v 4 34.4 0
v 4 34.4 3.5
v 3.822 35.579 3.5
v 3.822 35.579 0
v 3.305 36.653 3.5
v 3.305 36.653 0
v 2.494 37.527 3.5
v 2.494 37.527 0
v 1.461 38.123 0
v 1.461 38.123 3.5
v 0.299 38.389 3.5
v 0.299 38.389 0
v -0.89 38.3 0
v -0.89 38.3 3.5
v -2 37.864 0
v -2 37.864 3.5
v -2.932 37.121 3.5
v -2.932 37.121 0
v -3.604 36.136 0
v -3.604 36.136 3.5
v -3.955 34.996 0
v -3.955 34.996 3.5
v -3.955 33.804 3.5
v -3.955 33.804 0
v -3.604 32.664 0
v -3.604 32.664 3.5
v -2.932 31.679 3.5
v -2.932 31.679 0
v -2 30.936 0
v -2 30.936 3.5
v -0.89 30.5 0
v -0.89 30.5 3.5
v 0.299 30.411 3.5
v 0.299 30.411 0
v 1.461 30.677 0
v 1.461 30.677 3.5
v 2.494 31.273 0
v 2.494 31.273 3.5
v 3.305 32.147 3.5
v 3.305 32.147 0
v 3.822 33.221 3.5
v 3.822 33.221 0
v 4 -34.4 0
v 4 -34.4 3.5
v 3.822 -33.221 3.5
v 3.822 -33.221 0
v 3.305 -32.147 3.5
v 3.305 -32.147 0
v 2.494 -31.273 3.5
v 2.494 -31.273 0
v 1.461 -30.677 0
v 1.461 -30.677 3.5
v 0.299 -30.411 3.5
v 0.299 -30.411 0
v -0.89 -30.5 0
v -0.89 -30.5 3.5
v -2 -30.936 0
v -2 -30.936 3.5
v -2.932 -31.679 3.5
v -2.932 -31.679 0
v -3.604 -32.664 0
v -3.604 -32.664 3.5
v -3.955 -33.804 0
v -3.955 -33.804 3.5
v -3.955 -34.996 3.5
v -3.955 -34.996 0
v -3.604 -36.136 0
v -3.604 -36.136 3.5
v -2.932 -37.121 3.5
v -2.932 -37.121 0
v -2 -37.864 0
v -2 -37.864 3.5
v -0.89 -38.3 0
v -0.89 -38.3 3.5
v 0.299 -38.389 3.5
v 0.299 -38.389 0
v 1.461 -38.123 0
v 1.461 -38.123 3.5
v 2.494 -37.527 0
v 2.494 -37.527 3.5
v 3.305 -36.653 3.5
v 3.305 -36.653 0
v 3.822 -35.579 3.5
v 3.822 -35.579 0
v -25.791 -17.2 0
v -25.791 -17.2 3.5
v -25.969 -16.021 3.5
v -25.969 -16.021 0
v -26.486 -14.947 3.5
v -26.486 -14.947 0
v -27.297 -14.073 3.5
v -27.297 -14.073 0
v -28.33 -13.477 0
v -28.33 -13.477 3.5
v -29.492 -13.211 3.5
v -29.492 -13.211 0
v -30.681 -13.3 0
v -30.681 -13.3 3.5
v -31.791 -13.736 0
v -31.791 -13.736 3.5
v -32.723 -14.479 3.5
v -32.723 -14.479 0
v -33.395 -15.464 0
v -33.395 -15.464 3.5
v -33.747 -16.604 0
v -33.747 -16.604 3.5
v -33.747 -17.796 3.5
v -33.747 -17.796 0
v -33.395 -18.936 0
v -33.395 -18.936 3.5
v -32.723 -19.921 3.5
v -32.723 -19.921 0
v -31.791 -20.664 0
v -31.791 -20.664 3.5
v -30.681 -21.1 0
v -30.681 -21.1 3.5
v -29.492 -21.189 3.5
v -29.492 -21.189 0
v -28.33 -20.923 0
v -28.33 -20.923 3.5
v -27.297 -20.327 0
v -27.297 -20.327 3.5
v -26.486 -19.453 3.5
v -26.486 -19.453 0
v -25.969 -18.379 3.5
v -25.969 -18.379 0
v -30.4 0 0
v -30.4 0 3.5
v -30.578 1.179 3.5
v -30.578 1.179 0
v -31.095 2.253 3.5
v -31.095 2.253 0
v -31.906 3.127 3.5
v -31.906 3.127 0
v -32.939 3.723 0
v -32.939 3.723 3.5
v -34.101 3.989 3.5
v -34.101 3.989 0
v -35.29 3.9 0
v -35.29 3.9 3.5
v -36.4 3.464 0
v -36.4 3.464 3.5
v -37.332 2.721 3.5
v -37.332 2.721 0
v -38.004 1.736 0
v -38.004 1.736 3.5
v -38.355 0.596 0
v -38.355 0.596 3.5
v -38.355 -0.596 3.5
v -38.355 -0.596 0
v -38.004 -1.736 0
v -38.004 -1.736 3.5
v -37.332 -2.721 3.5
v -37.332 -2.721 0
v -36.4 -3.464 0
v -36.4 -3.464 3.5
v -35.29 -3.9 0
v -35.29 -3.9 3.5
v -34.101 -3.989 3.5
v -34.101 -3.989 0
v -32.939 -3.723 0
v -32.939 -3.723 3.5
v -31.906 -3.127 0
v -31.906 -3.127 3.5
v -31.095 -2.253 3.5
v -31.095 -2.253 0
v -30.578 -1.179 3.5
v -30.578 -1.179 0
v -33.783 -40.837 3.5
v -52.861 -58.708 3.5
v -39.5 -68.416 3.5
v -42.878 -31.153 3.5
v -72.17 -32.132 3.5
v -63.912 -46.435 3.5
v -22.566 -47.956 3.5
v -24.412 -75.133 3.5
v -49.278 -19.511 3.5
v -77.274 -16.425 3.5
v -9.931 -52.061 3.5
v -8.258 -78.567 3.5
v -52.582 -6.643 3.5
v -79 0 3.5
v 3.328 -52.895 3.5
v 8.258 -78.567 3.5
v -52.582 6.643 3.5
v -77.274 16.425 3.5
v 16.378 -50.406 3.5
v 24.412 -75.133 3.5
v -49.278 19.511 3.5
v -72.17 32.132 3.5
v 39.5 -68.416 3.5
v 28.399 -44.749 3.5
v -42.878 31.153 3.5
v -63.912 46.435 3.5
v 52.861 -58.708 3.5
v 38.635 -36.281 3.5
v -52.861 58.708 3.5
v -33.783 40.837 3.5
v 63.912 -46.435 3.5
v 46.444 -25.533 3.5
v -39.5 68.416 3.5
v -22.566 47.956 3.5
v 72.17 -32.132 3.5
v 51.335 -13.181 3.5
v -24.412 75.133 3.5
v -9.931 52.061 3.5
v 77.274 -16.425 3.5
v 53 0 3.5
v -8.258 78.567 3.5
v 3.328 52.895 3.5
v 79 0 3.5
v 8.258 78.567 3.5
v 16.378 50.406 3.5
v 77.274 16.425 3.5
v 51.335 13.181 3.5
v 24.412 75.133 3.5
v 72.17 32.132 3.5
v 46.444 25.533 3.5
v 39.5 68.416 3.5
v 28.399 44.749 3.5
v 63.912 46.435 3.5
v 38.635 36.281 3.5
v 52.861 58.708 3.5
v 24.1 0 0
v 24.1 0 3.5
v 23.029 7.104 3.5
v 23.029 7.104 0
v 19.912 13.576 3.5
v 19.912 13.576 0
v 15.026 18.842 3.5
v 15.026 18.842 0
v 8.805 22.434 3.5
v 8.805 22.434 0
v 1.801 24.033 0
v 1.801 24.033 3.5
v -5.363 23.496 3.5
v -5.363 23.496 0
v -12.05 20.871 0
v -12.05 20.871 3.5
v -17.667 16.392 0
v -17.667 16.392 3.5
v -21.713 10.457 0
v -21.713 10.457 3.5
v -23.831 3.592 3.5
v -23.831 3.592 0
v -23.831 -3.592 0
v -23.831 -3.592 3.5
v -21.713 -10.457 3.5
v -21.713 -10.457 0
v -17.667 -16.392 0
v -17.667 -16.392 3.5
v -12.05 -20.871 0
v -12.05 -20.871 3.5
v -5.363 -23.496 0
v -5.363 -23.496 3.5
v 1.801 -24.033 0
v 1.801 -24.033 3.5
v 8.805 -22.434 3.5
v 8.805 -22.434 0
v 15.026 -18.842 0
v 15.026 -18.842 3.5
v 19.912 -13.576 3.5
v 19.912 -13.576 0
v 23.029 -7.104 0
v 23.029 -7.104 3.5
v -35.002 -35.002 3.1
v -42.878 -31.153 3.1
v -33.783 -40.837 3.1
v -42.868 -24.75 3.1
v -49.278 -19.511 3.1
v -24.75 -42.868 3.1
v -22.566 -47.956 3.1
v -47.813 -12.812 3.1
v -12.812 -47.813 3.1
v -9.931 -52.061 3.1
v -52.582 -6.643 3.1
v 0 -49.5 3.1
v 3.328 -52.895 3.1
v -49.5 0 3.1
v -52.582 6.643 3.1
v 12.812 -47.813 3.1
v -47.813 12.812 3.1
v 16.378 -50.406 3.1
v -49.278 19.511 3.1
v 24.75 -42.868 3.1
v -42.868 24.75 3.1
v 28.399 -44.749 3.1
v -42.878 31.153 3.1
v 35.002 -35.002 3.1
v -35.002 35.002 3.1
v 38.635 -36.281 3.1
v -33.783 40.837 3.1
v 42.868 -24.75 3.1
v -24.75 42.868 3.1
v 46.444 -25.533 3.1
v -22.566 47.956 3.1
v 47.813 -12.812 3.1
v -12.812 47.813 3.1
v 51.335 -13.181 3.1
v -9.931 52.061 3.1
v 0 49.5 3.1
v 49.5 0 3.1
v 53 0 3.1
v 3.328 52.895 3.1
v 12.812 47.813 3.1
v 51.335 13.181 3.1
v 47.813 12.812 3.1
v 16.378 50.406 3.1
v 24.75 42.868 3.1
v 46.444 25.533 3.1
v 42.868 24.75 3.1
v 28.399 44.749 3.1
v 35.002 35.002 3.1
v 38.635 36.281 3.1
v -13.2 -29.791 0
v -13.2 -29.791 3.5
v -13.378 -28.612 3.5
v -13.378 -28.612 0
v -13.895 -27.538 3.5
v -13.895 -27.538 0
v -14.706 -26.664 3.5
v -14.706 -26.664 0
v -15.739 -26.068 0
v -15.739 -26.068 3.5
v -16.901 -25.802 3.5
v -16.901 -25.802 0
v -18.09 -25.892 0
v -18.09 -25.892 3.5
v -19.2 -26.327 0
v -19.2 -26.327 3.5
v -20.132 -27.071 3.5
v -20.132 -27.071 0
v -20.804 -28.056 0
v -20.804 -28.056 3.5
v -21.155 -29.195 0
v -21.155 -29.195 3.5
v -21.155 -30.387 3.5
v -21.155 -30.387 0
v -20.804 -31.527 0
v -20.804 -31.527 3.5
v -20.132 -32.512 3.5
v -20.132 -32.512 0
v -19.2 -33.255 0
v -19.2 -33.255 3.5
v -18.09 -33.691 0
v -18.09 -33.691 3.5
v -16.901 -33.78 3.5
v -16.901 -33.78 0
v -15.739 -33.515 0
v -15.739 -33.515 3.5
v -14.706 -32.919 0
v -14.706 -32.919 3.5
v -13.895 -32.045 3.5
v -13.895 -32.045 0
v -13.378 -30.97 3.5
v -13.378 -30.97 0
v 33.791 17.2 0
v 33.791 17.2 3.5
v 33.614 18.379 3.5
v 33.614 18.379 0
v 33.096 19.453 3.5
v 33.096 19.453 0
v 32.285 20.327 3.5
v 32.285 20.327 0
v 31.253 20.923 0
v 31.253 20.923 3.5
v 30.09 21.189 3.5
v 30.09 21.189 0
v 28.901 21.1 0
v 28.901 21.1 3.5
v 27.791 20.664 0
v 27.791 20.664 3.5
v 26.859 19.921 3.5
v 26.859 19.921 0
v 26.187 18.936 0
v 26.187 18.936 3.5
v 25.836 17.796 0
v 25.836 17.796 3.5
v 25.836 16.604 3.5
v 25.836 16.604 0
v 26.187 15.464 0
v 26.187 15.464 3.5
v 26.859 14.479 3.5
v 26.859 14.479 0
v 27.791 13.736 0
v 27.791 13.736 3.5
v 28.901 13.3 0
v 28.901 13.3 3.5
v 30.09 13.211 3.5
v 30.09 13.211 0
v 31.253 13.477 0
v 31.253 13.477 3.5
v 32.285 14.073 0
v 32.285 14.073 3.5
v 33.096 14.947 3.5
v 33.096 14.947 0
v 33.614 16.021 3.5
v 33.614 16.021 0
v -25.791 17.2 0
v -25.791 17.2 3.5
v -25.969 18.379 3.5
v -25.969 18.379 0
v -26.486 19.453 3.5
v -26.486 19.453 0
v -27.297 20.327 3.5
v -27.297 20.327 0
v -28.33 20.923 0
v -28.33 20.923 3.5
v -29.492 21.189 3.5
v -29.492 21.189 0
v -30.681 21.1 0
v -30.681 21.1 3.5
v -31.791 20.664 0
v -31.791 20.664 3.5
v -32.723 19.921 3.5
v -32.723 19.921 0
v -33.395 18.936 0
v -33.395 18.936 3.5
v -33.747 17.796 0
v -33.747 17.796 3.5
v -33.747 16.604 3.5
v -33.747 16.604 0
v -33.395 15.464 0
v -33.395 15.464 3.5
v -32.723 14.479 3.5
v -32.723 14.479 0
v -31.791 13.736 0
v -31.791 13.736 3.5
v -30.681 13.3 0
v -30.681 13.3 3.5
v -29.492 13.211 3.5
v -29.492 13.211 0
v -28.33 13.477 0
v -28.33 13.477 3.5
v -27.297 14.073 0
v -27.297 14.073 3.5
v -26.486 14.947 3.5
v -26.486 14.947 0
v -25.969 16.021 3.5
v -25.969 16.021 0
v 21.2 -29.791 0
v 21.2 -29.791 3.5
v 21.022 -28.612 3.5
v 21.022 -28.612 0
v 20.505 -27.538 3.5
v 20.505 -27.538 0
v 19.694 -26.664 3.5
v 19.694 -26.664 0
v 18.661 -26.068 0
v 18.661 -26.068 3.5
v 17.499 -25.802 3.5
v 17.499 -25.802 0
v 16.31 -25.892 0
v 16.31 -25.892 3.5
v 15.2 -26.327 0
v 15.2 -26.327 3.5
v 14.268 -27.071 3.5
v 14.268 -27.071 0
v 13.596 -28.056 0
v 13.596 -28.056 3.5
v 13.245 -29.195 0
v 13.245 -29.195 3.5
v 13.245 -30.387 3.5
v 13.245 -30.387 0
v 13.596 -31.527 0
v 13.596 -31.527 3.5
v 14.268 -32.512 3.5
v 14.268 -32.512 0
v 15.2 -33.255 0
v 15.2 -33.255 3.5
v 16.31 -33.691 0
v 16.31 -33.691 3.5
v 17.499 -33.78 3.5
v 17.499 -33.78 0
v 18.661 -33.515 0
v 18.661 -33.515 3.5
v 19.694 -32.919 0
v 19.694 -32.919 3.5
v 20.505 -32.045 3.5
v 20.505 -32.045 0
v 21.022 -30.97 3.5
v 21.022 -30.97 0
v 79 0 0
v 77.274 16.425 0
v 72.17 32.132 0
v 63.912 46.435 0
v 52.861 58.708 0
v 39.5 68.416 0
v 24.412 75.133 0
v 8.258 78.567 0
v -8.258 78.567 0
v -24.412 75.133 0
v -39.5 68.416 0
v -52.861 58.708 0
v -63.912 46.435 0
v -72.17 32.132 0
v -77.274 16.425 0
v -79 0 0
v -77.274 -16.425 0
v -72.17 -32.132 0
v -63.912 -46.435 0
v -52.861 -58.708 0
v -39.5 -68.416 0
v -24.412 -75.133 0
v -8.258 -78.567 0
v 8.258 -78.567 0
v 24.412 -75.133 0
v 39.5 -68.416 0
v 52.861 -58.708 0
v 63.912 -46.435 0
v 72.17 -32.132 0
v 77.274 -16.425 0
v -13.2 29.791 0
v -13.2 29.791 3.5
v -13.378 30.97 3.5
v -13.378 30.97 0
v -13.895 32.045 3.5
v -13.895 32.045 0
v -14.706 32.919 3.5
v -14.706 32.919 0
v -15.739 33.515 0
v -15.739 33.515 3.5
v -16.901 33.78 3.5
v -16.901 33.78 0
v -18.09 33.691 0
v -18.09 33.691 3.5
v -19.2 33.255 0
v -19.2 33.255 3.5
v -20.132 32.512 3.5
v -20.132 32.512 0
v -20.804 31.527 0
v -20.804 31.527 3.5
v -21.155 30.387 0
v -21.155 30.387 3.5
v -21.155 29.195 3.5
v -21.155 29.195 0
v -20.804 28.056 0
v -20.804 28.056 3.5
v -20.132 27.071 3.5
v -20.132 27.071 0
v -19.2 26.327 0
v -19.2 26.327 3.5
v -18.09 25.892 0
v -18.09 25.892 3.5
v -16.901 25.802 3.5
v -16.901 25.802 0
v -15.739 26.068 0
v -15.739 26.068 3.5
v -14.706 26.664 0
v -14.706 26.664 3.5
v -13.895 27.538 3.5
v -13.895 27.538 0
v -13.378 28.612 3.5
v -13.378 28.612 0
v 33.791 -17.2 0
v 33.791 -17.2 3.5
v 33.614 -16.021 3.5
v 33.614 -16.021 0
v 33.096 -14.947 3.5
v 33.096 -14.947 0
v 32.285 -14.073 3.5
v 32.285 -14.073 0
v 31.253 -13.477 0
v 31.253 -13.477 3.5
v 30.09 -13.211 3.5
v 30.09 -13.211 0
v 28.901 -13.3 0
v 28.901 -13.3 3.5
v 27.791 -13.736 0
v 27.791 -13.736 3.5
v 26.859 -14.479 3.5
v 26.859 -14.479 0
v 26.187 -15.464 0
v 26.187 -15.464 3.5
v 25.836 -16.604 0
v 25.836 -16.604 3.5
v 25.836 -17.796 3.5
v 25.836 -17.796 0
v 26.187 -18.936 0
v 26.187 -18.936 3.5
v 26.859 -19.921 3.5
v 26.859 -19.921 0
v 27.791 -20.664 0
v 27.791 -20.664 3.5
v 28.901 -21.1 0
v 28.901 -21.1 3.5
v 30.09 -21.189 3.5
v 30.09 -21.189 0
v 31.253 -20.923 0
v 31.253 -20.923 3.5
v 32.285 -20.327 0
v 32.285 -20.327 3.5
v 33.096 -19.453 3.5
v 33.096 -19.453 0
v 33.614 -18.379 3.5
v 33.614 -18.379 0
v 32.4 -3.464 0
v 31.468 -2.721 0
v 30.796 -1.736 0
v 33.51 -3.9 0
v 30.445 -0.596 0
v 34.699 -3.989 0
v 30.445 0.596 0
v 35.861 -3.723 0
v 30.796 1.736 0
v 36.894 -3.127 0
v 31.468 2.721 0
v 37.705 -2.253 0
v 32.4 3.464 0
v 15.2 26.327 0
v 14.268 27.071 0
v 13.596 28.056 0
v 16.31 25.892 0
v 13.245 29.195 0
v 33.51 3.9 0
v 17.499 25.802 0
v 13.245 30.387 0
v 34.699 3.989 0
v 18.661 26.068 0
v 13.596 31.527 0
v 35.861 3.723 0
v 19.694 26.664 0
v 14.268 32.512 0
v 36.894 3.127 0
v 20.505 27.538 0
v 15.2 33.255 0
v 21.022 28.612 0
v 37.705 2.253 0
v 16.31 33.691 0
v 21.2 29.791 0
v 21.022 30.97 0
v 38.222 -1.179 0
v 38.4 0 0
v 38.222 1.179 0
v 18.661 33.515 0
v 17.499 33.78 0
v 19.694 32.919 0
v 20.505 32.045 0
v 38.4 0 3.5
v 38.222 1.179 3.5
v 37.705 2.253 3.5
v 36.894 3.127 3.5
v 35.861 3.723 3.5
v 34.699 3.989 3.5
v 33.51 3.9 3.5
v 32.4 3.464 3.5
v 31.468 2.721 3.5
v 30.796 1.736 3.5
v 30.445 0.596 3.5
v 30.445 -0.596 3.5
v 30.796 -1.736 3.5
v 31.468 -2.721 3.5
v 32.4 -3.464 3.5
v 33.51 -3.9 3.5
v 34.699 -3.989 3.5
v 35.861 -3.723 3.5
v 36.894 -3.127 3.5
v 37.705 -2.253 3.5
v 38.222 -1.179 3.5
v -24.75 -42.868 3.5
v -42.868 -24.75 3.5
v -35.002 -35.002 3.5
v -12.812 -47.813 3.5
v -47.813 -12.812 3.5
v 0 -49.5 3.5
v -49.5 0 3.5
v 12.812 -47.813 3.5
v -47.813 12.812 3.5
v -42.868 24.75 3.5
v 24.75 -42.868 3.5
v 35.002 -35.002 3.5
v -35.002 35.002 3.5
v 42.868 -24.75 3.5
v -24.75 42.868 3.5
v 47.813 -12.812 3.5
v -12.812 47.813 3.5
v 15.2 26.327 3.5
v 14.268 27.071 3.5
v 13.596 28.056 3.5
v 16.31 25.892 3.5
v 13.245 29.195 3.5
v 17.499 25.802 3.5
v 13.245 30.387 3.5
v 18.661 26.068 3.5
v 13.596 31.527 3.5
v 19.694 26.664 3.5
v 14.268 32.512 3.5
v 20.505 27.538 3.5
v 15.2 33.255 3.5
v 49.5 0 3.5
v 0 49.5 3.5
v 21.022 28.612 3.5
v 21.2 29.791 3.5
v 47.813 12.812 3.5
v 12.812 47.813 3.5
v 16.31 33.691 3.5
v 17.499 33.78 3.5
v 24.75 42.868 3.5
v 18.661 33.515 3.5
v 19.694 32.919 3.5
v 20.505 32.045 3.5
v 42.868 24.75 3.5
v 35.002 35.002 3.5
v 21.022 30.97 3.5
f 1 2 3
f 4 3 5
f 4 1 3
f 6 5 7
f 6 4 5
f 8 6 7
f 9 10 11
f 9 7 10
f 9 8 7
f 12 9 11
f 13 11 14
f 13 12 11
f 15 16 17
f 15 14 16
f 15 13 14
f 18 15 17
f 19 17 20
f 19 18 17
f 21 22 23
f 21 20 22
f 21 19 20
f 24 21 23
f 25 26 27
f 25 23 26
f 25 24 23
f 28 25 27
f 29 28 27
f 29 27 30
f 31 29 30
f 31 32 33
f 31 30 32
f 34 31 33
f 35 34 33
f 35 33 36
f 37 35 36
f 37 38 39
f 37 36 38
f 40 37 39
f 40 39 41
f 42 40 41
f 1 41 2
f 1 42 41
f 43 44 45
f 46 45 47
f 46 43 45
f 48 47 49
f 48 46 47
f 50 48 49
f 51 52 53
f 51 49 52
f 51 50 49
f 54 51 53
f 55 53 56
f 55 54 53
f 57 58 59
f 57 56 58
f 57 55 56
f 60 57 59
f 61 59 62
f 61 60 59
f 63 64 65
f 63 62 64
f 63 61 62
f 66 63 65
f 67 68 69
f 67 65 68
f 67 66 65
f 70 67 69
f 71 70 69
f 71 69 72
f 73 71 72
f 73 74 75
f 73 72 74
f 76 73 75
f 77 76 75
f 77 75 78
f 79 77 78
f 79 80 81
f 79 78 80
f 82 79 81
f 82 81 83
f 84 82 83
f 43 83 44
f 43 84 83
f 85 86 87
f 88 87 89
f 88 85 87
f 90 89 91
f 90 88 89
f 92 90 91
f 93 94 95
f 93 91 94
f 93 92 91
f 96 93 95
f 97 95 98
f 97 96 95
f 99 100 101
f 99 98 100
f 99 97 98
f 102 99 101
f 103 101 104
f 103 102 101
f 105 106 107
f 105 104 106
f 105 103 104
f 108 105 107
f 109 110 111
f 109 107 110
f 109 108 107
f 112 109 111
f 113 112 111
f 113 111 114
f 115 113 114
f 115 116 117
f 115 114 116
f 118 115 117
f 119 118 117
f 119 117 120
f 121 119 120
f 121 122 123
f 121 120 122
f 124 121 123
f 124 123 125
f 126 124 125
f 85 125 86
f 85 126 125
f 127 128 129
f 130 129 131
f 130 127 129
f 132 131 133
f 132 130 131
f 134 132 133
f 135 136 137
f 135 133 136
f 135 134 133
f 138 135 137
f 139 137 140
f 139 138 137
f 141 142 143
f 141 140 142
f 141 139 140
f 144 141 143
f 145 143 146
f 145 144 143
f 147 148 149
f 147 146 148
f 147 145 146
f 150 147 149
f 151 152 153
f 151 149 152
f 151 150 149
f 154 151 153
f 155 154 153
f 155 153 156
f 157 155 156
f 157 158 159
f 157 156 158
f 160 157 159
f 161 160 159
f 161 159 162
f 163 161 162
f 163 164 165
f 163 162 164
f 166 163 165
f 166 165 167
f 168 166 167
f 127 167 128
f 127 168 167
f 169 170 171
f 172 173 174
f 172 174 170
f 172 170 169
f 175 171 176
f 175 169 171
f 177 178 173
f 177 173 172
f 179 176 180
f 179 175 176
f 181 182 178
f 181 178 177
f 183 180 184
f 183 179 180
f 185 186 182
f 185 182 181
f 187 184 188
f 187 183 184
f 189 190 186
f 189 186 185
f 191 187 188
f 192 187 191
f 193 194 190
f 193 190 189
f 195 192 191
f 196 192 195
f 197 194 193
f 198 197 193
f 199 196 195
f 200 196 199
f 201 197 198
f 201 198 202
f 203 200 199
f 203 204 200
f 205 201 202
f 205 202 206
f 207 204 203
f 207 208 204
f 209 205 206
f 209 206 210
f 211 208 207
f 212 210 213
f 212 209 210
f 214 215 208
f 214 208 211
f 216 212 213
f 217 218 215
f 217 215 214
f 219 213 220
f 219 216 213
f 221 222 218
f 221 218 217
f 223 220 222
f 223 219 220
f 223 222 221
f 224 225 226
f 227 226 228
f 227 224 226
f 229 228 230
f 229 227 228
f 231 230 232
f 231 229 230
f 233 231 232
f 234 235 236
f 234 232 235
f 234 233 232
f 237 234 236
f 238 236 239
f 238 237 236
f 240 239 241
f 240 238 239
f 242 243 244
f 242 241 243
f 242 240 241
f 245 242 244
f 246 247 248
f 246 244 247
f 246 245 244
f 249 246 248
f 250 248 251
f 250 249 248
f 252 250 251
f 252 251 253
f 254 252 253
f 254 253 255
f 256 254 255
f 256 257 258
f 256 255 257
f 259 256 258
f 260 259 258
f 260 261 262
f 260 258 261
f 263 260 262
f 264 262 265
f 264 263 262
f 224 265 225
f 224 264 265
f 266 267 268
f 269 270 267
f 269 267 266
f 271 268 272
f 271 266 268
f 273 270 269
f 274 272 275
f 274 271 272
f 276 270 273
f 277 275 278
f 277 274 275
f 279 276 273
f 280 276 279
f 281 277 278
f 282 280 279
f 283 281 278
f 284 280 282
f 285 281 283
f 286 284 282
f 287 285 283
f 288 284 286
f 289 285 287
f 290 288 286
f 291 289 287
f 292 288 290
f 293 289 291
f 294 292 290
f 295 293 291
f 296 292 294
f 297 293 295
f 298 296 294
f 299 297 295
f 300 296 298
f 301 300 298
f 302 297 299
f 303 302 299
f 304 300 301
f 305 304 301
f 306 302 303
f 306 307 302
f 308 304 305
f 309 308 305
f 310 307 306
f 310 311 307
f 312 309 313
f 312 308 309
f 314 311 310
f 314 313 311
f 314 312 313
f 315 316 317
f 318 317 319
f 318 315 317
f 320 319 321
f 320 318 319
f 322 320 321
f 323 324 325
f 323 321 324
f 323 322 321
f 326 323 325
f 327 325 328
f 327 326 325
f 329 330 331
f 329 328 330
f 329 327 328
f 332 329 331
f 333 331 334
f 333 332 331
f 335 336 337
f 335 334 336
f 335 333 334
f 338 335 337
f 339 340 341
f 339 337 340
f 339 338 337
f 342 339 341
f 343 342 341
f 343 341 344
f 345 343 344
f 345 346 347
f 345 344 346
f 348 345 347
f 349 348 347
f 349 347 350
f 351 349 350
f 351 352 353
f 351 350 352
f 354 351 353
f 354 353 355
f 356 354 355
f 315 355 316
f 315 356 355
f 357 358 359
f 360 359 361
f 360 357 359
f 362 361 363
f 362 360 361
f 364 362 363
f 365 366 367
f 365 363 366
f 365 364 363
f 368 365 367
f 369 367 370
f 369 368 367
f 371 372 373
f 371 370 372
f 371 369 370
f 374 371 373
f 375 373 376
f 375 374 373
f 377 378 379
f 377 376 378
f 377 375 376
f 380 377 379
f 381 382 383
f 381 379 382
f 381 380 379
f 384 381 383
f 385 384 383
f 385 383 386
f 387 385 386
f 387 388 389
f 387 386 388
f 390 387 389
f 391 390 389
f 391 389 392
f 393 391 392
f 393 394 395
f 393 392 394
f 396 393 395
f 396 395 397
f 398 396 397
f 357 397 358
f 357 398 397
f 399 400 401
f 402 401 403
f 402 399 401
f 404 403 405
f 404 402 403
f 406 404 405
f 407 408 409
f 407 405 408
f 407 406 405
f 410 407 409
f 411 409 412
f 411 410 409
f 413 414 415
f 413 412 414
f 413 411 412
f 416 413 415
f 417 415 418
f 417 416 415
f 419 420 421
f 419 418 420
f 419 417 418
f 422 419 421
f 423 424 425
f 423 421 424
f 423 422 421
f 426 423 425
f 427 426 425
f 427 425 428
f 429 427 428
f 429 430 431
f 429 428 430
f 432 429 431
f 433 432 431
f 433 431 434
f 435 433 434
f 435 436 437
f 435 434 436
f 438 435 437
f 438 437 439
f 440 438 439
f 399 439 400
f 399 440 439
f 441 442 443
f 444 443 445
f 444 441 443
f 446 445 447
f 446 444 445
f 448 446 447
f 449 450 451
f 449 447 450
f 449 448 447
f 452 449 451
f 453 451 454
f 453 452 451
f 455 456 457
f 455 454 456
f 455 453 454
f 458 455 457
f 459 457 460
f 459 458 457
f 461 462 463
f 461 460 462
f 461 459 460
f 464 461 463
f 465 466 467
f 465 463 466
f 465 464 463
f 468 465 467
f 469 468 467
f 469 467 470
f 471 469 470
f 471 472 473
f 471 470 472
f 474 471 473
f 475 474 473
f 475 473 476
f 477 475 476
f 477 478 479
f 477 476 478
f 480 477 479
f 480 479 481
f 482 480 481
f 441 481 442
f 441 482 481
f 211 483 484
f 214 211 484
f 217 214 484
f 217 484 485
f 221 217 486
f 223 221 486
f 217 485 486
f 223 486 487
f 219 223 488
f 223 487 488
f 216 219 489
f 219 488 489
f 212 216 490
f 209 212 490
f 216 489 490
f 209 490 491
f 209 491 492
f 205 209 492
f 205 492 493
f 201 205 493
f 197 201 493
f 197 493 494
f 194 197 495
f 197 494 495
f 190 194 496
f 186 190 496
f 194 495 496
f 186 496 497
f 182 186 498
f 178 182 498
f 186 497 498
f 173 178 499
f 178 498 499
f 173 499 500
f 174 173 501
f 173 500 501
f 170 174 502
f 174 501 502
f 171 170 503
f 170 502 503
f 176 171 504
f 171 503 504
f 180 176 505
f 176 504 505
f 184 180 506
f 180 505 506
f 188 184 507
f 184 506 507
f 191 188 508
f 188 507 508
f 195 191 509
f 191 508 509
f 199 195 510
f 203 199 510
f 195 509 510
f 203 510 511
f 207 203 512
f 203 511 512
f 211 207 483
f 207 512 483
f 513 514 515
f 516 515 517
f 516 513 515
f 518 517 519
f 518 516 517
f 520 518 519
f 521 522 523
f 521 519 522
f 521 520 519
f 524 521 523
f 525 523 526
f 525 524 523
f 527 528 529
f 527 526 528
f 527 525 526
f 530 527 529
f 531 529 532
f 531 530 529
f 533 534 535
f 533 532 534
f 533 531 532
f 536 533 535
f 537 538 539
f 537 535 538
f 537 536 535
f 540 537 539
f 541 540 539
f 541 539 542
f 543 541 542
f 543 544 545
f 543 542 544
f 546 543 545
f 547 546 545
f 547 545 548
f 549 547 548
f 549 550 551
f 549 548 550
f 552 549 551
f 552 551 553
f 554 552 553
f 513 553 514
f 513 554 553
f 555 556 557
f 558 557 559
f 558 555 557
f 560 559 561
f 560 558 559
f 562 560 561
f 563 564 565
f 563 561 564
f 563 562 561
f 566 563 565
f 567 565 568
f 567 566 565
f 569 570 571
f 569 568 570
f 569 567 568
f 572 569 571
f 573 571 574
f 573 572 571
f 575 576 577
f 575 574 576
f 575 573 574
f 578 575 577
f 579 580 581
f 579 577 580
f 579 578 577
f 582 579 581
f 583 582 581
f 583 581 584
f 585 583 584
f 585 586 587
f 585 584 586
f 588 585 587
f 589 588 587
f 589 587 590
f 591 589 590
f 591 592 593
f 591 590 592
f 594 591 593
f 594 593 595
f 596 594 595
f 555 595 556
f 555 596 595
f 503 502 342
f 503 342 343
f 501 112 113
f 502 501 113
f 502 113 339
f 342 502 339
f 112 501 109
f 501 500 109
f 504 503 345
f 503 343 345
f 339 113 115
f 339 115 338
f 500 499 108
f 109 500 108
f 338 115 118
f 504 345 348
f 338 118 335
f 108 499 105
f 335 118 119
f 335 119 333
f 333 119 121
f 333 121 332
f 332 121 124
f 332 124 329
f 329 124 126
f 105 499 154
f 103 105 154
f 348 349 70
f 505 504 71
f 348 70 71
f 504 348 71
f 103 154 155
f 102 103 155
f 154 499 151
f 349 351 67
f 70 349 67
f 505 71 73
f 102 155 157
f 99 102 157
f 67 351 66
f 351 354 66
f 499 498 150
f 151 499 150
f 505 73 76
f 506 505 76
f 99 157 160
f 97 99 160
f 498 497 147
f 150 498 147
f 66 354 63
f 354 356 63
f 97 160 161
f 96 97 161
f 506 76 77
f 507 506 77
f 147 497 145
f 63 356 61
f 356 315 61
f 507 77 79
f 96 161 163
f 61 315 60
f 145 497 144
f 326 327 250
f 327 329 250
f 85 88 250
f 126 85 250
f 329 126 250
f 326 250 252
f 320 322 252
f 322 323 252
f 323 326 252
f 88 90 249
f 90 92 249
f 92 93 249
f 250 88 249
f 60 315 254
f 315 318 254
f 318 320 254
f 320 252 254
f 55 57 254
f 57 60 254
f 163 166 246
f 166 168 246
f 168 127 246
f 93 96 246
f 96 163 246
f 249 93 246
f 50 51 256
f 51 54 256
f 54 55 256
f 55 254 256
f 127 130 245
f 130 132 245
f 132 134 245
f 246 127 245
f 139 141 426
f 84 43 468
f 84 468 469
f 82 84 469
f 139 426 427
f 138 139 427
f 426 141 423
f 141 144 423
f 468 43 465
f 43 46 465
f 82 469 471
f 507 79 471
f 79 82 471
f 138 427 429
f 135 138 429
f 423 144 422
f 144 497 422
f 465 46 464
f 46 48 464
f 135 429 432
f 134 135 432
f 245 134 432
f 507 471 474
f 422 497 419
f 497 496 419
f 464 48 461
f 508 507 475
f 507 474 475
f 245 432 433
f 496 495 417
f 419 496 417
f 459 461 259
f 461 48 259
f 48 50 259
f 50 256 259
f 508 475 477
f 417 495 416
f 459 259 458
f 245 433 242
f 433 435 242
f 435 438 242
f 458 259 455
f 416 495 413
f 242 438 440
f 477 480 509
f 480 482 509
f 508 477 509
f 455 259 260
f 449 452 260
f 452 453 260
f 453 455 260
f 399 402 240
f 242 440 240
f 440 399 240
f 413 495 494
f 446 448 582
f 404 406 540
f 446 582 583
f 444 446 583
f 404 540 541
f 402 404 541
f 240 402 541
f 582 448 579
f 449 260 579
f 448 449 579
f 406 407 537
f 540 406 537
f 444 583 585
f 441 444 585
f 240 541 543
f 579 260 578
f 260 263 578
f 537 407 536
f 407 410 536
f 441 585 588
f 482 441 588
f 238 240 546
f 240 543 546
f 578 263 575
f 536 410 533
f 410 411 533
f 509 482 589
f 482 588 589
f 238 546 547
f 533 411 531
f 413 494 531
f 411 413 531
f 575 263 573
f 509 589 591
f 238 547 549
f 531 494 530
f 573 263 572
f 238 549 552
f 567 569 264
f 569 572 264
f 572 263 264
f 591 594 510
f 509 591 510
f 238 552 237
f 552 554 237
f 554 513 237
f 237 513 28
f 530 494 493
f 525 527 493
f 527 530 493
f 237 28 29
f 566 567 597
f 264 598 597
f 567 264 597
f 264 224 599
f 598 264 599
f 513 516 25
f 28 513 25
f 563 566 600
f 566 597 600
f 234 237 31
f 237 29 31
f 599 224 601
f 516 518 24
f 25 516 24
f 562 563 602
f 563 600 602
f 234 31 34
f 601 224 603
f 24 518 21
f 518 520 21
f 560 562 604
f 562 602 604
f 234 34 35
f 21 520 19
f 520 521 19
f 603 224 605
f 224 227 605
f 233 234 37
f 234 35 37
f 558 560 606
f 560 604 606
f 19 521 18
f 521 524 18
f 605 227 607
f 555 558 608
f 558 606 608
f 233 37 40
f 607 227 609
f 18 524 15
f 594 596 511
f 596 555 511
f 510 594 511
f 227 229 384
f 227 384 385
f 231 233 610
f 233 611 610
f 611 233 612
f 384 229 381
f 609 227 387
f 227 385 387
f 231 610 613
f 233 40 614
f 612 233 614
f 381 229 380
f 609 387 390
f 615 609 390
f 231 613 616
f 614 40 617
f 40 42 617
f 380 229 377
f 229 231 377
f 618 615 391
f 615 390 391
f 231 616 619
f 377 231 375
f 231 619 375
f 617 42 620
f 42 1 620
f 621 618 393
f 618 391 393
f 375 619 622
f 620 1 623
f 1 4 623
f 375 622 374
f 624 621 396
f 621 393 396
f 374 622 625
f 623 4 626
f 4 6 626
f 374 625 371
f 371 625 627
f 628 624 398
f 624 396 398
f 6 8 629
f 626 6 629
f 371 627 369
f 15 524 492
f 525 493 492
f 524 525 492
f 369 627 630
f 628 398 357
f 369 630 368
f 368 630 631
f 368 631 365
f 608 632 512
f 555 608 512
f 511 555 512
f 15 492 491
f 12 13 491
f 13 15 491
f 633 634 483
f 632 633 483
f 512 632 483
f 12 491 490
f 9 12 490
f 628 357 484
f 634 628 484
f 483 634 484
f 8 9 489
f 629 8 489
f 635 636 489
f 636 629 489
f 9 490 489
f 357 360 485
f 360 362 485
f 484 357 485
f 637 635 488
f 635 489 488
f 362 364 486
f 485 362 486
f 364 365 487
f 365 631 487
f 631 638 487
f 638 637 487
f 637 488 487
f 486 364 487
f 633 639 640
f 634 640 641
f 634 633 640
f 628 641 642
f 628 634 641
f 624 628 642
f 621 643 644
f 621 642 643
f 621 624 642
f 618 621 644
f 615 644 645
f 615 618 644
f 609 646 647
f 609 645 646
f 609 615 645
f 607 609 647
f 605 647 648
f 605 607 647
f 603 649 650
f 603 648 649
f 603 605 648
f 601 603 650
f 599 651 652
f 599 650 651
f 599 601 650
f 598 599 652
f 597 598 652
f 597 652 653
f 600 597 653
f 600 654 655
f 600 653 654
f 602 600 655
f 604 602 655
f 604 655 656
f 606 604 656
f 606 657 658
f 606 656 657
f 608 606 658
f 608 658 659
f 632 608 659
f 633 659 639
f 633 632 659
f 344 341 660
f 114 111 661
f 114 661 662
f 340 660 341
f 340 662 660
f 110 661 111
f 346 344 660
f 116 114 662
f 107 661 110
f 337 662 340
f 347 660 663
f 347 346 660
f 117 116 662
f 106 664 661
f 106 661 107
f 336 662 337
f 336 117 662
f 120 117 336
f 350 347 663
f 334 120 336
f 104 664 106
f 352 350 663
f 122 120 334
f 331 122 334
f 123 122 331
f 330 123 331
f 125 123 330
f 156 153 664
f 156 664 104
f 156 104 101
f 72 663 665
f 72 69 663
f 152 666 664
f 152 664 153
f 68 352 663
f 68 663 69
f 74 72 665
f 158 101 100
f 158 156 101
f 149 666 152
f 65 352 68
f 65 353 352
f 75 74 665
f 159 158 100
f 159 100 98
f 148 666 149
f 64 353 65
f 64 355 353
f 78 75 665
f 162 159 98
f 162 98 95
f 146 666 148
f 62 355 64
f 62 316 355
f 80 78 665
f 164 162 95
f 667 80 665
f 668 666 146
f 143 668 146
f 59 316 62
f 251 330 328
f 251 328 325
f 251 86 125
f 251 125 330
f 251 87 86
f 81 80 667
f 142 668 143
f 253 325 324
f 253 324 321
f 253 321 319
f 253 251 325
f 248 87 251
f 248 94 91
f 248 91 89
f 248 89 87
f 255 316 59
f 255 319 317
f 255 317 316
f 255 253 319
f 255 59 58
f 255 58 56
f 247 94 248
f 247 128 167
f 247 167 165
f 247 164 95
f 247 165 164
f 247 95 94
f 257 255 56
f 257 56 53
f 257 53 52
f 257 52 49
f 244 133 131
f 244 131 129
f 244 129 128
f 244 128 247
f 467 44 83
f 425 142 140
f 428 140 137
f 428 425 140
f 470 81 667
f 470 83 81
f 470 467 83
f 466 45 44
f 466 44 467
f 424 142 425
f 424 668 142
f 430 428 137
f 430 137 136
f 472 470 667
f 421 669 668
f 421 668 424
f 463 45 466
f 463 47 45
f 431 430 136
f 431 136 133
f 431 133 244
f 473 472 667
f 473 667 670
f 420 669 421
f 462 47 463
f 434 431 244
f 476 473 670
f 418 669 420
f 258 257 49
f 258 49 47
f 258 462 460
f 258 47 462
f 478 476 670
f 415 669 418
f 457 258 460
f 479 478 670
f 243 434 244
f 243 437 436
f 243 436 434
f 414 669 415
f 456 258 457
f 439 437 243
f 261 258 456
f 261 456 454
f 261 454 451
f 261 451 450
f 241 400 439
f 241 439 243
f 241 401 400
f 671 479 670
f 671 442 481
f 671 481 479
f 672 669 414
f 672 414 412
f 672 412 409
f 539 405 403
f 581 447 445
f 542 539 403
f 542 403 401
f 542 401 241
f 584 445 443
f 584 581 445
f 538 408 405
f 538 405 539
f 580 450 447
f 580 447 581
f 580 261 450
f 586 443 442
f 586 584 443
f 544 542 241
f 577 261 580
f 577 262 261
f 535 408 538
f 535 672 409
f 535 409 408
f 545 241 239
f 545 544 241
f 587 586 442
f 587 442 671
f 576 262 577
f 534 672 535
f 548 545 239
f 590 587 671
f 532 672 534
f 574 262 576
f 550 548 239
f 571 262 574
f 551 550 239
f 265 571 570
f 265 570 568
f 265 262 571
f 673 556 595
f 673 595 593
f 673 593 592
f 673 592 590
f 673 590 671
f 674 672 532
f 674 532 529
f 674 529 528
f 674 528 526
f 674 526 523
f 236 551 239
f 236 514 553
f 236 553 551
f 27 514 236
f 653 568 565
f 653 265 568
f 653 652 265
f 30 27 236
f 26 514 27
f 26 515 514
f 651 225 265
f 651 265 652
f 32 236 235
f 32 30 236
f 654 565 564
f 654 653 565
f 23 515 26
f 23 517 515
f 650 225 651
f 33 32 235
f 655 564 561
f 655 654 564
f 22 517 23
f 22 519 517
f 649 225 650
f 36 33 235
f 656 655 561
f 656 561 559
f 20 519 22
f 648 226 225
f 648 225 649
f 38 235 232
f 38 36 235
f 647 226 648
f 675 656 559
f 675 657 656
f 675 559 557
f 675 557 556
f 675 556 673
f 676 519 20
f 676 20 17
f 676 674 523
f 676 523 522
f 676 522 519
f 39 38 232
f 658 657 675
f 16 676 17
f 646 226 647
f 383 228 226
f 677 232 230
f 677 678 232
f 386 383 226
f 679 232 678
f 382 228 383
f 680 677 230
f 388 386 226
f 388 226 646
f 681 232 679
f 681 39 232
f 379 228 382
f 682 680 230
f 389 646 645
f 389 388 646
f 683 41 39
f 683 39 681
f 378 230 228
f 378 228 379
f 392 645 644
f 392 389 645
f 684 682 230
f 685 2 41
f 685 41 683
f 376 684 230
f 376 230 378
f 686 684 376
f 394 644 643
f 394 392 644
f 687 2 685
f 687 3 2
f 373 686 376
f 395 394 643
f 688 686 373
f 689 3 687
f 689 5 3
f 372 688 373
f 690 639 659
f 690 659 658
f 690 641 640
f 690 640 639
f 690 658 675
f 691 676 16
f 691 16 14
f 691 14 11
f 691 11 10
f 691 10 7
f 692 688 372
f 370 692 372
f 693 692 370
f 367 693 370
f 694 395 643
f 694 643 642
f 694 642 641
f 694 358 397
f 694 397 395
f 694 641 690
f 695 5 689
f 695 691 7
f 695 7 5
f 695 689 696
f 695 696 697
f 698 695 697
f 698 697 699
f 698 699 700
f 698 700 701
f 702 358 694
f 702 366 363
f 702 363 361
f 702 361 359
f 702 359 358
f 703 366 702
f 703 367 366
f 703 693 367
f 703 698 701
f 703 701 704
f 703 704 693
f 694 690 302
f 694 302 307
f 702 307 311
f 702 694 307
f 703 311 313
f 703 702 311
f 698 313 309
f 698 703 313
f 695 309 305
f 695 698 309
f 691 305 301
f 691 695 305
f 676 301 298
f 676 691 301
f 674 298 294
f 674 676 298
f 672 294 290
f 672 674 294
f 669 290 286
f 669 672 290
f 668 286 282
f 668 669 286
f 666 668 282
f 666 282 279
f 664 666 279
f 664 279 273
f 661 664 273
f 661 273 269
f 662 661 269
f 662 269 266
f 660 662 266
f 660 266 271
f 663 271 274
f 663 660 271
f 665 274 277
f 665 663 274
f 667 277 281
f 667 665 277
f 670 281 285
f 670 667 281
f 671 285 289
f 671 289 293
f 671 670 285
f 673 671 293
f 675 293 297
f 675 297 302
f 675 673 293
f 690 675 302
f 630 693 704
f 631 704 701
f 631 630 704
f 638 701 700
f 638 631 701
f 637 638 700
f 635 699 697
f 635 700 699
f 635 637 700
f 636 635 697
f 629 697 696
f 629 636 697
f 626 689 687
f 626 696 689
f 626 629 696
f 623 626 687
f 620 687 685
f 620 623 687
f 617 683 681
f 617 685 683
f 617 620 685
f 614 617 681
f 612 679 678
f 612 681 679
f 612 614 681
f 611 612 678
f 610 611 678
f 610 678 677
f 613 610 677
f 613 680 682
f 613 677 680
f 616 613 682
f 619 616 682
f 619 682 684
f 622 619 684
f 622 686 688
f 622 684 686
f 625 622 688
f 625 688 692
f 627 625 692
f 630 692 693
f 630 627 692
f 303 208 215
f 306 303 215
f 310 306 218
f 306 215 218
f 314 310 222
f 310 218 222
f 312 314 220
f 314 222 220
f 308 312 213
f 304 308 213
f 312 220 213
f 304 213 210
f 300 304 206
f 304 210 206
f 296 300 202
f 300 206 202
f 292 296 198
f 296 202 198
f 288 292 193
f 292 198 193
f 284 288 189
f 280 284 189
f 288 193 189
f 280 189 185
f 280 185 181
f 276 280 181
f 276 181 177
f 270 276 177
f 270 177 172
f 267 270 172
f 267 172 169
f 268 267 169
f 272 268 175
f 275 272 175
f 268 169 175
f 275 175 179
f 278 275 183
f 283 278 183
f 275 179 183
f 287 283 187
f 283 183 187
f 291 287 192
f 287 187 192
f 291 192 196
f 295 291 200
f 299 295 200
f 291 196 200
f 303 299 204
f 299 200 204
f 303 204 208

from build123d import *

# Parameters (mm, degrees)
SKETCH1_R           = 79
BOSS_EXTRUDE1_DEPTH = 3.5
SKETCH2_R           = 4
SKETCH2_R_2         = 24.1
CUT_EXTRUDE1_DEPTH  = 112.777681135
SKETCH3_R           = 53
SKETCH3_R_2         = 49.5
CUT_EXTRUDE2_DEPTH  = 0.4


with BuildPart() as part:
    # Sketch1 → Boss-Extrude1 (new body)
    with BuildSketch(Plane.XY):
        Circle(SKETCH1_R)
    extrude(amount=BOSS_EXTRUDE1_DEPTH)

    # Sketch2 → Cut-Extrude1 (cut, through all)
    with BuildSketch(Plane.XY):
        with Locations((34.4, 0)):
            Circle(SKETCH2_R)
        with Locations((29.79127389, -17.2)):
            Circle(SKETCH2_R)
        with Locations((17.2, -29.79127389)):
            Circle(SKETCH2_R)
        with Locations((0, -34.4)):
            Circle(SKETCH2_R)
        with Locations((-17.2, -29.79127389)):
            Circle(SKETCH2_R)
        with Locations((-29.79127389, -17.2)):
            Circle(SKETCH2_R)
        with Locations((-34.4, 0)):
            Circle(SKETCH2_R)
        with Locations((-29.79127389, 17.2)):
            Circle(SKETCH2_R)
        with Locations((-17.2, 29.79127389)):
            Circle(SKETCH2_R)
        with Locations((0, 34.4)):
            Circle(SKETCH2_R)
        with Locations((17.2, 29.79127389)):
            Circle(SKETCH2_R)
        with Locations((29.79127389, 17.2)):
            Circle(SKETCH2_R)
        Circle(SKETCH2_R_2)
    extrude(amount=CUT_EXTRUDE1_DEPTH, mode=Mode.SUBTRACT)

    # Sketch3 → Cut-Extrude2 (cut)
    with BuildSketch(Plane.XY.offset(3.5)):
        Circle(SKETCH3_R)
        Circle(SKETCH3_R_2, mode=Mode.SUBTRACT)
    extrude(amount=-CUT_EXTRUDE2_DEPTH, mode=Mode.SUBTRACT)


solid = part.part
